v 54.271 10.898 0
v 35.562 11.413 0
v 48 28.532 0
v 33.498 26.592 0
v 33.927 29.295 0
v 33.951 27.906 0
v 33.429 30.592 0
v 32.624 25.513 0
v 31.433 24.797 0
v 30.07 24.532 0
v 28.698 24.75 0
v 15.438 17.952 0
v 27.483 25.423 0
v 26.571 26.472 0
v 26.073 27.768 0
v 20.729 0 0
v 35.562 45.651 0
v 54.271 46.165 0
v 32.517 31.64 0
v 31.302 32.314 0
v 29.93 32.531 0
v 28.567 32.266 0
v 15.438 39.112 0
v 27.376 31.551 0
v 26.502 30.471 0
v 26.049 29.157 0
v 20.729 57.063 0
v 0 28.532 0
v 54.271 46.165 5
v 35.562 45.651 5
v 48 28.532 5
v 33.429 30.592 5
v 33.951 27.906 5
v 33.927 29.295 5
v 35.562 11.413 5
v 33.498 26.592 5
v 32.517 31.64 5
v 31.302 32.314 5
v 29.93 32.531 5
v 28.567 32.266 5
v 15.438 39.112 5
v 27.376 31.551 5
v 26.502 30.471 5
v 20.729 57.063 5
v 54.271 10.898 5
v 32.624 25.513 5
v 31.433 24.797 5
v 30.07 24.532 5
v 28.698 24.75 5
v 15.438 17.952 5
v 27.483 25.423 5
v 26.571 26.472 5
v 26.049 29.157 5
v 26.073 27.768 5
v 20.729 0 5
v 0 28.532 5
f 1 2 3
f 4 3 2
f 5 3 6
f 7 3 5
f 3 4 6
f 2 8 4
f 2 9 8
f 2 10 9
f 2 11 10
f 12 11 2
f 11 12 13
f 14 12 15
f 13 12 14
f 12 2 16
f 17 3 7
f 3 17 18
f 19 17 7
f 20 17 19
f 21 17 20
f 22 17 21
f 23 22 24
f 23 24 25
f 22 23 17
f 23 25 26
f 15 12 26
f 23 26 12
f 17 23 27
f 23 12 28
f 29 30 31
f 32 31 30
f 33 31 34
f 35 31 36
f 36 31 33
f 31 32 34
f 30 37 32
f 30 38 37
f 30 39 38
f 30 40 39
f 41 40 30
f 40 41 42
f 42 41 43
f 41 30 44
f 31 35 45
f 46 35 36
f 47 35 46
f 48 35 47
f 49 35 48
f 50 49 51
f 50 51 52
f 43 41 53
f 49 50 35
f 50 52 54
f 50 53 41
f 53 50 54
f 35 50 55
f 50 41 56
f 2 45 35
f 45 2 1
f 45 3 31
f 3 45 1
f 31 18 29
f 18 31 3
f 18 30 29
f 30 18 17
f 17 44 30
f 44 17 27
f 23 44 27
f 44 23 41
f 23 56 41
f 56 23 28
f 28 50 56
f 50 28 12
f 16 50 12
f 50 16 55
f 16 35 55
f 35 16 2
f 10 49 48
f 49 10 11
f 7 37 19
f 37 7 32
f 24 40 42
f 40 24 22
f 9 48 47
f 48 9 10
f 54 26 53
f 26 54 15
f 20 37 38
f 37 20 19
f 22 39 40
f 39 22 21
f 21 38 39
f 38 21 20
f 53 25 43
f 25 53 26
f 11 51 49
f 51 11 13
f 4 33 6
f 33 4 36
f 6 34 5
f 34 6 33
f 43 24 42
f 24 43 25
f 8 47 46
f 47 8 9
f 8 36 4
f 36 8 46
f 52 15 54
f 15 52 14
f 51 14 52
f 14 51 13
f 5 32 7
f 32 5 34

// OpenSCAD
$fn = 32;

// ----------------------------------------------------------------------
// Star wheel: 5-point blunt, R30
// ----------------------------------------------------------------------

// --- parameters (mm) ---
n_points = 5;             // number of points / teeth
r_out = 30;               // tip radius
r_in = 18;                // root radius
bore_r = 4;               // centre bore radius
plate_t = 5;              // plate thickness, Z (extrusion height)
bore_d = 8;               // centre bore diameter

profile = [[0, 28.532], [15.438, 17.952], [20.729, 0], [35.562, 11.413], [54.271, 10.898], [48, 28.532], [54.271, 46.165], [35.562, 45.651], [20.729, 57.063], [15.438, 39.112]];  // primary outline, 10 points, counter clockwise
void_1 = [[33.927, 29.295], [33.429, 30.592], [32.517, 31.64], [31.302, 32.314], [29.93, 32.531], [28.567, 32.266], [27.376, 31.551], [26.502, 30.471], [26.049, 29.157], [26.073, 27.768], [26.571, 26.472], [27.483, 25.423], [28.698, 24.75], [30.07, 24.532], [31.433, 24.797], [32.624, 25.513], [33.498, 26.592], [33.951, 27.906]];  // centre bore, 18 points

// --- the one profile operation ---
difference() {
  linear_extrude(height = plate_t) polygon(points = profile);
  translate([0, 0, -1])
    linear_extrude(height = plate_t + 2) polygon(points = void_1);
}
